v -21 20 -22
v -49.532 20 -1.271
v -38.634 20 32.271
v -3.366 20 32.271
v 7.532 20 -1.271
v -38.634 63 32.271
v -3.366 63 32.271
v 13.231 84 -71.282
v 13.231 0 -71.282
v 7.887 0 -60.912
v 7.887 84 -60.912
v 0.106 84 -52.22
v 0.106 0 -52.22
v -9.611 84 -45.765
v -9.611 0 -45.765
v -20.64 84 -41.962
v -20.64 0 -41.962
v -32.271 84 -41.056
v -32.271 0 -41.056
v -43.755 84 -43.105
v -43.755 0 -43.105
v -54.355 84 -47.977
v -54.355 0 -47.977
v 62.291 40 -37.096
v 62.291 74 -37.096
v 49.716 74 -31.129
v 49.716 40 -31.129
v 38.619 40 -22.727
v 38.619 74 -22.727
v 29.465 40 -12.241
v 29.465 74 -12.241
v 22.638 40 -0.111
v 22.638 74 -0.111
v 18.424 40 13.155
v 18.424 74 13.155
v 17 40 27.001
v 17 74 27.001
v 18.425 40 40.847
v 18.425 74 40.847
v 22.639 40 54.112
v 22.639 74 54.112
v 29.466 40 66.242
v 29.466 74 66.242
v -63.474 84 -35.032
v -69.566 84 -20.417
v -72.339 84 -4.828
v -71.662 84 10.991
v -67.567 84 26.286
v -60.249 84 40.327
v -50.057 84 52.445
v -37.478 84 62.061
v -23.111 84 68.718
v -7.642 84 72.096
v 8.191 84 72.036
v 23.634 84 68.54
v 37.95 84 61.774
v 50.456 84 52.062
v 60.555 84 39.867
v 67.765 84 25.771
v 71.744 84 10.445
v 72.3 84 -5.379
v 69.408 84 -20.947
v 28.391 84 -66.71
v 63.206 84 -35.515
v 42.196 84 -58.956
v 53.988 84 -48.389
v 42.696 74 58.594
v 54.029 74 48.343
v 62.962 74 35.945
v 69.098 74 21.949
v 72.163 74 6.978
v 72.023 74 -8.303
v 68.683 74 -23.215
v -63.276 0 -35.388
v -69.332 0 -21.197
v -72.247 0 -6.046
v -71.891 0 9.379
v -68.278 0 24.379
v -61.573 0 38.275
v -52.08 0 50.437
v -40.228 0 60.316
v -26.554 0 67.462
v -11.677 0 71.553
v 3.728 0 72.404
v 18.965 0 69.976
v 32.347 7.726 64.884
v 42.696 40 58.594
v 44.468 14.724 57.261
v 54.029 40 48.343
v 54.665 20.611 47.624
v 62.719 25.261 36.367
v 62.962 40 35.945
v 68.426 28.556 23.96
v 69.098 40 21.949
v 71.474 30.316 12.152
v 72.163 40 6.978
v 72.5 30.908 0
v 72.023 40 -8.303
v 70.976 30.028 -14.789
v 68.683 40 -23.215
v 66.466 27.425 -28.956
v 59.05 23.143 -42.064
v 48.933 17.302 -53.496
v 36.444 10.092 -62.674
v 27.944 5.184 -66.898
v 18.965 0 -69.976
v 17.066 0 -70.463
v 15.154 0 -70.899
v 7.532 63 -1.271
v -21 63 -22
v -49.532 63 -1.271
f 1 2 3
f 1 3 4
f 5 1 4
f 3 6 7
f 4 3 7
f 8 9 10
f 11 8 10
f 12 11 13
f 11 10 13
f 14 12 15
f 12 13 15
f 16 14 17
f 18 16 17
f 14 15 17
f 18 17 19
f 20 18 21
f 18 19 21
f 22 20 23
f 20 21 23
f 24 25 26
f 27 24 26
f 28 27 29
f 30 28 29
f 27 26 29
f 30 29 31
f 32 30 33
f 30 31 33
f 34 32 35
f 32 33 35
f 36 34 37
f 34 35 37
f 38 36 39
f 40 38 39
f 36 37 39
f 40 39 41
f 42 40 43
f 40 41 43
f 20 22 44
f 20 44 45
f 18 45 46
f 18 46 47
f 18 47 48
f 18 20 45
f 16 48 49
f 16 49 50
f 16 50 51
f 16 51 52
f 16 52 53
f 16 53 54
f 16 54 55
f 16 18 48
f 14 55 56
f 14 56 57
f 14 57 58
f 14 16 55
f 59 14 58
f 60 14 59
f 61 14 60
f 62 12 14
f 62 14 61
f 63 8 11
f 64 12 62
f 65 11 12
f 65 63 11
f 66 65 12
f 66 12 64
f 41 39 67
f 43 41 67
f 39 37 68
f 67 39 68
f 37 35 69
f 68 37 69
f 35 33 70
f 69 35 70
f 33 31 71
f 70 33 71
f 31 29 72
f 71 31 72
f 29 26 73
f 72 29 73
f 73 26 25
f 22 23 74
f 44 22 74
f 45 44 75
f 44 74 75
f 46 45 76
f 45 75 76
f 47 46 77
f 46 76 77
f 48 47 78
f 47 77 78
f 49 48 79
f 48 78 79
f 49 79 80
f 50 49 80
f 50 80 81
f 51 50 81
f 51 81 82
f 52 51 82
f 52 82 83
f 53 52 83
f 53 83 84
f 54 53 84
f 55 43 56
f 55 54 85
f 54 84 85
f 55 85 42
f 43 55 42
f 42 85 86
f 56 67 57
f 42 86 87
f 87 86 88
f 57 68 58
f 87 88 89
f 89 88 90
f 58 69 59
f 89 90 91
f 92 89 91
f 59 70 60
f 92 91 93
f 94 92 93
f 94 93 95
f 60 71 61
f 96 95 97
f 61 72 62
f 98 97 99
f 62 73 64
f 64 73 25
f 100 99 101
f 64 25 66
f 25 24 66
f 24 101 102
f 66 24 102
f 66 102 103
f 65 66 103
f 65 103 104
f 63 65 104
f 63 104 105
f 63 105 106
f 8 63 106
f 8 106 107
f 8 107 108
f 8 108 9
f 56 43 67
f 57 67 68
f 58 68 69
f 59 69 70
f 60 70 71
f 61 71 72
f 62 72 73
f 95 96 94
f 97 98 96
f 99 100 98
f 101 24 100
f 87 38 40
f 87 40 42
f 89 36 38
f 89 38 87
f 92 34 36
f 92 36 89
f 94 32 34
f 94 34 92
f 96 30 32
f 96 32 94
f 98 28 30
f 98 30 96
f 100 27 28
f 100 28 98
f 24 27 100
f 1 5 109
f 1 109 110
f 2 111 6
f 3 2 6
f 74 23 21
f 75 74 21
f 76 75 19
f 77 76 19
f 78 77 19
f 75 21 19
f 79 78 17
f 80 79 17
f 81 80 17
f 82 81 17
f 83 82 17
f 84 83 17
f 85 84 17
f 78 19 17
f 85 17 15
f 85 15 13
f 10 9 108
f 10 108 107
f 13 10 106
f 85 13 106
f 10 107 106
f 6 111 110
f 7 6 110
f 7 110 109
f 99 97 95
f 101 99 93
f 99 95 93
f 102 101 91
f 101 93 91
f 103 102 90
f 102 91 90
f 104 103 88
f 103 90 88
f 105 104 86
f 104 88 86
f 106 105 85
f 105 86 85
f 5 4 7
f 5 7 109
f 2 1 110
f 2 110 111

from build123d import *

# Parameters (mm, degrees)
BOSS_EXTRUDE1_DEPTH = 84
CUT_EXTRUDE2_DEPTH  = 34
CUT_EXTRUDE3_DEPTH  = 144.7823905
CUT_EXTRUDE4_DEPTH  = 43


with BuildPart() as part:
    # Sketch1 → Boss-Extrude1 (new body)
    with BuildSketch(Plane(origin=(0, 0, 0), x_dir=(1, 0, 0), z_dir=(0, 1, 0))):
        with BuildLine():
            ThreePointArc((-54.355236912, 47.976642444), (23.634324541, -68.539541168), (13.231432449, 71.2823905))
            ThreePointArc((13.231432449, 71.2823905), (-15.004428567, 43.512842845), (-54.355236912, 47.976642444))
        make_face()
    extrude(amount=BOSS_EXTRUDE1_DEPTH)

    # Sketch3 → Cut-Extrude2 (cut)
    with BuildSketch(Plane(origin=(0, 74, 0), x_dir=(1, 0, 0), z_dir=(0, 1, 0))):
        with BuildLine():
            ThreePointArc((62.290772837, 37.095951523), (20.191041077, -6.413624813), (29.465733324, -66.242135833))
            ThreePointArc((29.465733324, -66.242135833), (69.097787087, -21.948708839), (62.290772837, 37.095951523))
        make_face()
    extrude(amount=-CUT_EXTRUDE2_DEPTH, mode=Mode.SUBTRACT)

    # Sketch9 → Cut-Extrude3 (cut, through all)
    with BuildSketch(Plane.XY.offset(72.5)):
        Polygon((72.5, 30.908380348), (18.965114857, 0), (72.5, 0), align=None)
    extrude(amount=-CUT_EXTRUDE3_DEPTH, mode=Mode.SUBTRACT)

    # Sketch10 → Cut-Extrude4 (cut)
    with BuildSketch(Plane(origin=(0, 63, 0), x_dir=(1, 0, 0), z_dir=(0, 1, 0))):
        Polygon((-3.366442431, -32.270509831), (7.531695489, 1.270509831), (-21, 22), (-49.531695489, 1.270509831), (-38.633557569, -32.270509831), align=None)
    extrude(amount=-CUT_EXTRUDE4_DEPTH, mode=Mode.SUBTRACT)


solid = part.part
